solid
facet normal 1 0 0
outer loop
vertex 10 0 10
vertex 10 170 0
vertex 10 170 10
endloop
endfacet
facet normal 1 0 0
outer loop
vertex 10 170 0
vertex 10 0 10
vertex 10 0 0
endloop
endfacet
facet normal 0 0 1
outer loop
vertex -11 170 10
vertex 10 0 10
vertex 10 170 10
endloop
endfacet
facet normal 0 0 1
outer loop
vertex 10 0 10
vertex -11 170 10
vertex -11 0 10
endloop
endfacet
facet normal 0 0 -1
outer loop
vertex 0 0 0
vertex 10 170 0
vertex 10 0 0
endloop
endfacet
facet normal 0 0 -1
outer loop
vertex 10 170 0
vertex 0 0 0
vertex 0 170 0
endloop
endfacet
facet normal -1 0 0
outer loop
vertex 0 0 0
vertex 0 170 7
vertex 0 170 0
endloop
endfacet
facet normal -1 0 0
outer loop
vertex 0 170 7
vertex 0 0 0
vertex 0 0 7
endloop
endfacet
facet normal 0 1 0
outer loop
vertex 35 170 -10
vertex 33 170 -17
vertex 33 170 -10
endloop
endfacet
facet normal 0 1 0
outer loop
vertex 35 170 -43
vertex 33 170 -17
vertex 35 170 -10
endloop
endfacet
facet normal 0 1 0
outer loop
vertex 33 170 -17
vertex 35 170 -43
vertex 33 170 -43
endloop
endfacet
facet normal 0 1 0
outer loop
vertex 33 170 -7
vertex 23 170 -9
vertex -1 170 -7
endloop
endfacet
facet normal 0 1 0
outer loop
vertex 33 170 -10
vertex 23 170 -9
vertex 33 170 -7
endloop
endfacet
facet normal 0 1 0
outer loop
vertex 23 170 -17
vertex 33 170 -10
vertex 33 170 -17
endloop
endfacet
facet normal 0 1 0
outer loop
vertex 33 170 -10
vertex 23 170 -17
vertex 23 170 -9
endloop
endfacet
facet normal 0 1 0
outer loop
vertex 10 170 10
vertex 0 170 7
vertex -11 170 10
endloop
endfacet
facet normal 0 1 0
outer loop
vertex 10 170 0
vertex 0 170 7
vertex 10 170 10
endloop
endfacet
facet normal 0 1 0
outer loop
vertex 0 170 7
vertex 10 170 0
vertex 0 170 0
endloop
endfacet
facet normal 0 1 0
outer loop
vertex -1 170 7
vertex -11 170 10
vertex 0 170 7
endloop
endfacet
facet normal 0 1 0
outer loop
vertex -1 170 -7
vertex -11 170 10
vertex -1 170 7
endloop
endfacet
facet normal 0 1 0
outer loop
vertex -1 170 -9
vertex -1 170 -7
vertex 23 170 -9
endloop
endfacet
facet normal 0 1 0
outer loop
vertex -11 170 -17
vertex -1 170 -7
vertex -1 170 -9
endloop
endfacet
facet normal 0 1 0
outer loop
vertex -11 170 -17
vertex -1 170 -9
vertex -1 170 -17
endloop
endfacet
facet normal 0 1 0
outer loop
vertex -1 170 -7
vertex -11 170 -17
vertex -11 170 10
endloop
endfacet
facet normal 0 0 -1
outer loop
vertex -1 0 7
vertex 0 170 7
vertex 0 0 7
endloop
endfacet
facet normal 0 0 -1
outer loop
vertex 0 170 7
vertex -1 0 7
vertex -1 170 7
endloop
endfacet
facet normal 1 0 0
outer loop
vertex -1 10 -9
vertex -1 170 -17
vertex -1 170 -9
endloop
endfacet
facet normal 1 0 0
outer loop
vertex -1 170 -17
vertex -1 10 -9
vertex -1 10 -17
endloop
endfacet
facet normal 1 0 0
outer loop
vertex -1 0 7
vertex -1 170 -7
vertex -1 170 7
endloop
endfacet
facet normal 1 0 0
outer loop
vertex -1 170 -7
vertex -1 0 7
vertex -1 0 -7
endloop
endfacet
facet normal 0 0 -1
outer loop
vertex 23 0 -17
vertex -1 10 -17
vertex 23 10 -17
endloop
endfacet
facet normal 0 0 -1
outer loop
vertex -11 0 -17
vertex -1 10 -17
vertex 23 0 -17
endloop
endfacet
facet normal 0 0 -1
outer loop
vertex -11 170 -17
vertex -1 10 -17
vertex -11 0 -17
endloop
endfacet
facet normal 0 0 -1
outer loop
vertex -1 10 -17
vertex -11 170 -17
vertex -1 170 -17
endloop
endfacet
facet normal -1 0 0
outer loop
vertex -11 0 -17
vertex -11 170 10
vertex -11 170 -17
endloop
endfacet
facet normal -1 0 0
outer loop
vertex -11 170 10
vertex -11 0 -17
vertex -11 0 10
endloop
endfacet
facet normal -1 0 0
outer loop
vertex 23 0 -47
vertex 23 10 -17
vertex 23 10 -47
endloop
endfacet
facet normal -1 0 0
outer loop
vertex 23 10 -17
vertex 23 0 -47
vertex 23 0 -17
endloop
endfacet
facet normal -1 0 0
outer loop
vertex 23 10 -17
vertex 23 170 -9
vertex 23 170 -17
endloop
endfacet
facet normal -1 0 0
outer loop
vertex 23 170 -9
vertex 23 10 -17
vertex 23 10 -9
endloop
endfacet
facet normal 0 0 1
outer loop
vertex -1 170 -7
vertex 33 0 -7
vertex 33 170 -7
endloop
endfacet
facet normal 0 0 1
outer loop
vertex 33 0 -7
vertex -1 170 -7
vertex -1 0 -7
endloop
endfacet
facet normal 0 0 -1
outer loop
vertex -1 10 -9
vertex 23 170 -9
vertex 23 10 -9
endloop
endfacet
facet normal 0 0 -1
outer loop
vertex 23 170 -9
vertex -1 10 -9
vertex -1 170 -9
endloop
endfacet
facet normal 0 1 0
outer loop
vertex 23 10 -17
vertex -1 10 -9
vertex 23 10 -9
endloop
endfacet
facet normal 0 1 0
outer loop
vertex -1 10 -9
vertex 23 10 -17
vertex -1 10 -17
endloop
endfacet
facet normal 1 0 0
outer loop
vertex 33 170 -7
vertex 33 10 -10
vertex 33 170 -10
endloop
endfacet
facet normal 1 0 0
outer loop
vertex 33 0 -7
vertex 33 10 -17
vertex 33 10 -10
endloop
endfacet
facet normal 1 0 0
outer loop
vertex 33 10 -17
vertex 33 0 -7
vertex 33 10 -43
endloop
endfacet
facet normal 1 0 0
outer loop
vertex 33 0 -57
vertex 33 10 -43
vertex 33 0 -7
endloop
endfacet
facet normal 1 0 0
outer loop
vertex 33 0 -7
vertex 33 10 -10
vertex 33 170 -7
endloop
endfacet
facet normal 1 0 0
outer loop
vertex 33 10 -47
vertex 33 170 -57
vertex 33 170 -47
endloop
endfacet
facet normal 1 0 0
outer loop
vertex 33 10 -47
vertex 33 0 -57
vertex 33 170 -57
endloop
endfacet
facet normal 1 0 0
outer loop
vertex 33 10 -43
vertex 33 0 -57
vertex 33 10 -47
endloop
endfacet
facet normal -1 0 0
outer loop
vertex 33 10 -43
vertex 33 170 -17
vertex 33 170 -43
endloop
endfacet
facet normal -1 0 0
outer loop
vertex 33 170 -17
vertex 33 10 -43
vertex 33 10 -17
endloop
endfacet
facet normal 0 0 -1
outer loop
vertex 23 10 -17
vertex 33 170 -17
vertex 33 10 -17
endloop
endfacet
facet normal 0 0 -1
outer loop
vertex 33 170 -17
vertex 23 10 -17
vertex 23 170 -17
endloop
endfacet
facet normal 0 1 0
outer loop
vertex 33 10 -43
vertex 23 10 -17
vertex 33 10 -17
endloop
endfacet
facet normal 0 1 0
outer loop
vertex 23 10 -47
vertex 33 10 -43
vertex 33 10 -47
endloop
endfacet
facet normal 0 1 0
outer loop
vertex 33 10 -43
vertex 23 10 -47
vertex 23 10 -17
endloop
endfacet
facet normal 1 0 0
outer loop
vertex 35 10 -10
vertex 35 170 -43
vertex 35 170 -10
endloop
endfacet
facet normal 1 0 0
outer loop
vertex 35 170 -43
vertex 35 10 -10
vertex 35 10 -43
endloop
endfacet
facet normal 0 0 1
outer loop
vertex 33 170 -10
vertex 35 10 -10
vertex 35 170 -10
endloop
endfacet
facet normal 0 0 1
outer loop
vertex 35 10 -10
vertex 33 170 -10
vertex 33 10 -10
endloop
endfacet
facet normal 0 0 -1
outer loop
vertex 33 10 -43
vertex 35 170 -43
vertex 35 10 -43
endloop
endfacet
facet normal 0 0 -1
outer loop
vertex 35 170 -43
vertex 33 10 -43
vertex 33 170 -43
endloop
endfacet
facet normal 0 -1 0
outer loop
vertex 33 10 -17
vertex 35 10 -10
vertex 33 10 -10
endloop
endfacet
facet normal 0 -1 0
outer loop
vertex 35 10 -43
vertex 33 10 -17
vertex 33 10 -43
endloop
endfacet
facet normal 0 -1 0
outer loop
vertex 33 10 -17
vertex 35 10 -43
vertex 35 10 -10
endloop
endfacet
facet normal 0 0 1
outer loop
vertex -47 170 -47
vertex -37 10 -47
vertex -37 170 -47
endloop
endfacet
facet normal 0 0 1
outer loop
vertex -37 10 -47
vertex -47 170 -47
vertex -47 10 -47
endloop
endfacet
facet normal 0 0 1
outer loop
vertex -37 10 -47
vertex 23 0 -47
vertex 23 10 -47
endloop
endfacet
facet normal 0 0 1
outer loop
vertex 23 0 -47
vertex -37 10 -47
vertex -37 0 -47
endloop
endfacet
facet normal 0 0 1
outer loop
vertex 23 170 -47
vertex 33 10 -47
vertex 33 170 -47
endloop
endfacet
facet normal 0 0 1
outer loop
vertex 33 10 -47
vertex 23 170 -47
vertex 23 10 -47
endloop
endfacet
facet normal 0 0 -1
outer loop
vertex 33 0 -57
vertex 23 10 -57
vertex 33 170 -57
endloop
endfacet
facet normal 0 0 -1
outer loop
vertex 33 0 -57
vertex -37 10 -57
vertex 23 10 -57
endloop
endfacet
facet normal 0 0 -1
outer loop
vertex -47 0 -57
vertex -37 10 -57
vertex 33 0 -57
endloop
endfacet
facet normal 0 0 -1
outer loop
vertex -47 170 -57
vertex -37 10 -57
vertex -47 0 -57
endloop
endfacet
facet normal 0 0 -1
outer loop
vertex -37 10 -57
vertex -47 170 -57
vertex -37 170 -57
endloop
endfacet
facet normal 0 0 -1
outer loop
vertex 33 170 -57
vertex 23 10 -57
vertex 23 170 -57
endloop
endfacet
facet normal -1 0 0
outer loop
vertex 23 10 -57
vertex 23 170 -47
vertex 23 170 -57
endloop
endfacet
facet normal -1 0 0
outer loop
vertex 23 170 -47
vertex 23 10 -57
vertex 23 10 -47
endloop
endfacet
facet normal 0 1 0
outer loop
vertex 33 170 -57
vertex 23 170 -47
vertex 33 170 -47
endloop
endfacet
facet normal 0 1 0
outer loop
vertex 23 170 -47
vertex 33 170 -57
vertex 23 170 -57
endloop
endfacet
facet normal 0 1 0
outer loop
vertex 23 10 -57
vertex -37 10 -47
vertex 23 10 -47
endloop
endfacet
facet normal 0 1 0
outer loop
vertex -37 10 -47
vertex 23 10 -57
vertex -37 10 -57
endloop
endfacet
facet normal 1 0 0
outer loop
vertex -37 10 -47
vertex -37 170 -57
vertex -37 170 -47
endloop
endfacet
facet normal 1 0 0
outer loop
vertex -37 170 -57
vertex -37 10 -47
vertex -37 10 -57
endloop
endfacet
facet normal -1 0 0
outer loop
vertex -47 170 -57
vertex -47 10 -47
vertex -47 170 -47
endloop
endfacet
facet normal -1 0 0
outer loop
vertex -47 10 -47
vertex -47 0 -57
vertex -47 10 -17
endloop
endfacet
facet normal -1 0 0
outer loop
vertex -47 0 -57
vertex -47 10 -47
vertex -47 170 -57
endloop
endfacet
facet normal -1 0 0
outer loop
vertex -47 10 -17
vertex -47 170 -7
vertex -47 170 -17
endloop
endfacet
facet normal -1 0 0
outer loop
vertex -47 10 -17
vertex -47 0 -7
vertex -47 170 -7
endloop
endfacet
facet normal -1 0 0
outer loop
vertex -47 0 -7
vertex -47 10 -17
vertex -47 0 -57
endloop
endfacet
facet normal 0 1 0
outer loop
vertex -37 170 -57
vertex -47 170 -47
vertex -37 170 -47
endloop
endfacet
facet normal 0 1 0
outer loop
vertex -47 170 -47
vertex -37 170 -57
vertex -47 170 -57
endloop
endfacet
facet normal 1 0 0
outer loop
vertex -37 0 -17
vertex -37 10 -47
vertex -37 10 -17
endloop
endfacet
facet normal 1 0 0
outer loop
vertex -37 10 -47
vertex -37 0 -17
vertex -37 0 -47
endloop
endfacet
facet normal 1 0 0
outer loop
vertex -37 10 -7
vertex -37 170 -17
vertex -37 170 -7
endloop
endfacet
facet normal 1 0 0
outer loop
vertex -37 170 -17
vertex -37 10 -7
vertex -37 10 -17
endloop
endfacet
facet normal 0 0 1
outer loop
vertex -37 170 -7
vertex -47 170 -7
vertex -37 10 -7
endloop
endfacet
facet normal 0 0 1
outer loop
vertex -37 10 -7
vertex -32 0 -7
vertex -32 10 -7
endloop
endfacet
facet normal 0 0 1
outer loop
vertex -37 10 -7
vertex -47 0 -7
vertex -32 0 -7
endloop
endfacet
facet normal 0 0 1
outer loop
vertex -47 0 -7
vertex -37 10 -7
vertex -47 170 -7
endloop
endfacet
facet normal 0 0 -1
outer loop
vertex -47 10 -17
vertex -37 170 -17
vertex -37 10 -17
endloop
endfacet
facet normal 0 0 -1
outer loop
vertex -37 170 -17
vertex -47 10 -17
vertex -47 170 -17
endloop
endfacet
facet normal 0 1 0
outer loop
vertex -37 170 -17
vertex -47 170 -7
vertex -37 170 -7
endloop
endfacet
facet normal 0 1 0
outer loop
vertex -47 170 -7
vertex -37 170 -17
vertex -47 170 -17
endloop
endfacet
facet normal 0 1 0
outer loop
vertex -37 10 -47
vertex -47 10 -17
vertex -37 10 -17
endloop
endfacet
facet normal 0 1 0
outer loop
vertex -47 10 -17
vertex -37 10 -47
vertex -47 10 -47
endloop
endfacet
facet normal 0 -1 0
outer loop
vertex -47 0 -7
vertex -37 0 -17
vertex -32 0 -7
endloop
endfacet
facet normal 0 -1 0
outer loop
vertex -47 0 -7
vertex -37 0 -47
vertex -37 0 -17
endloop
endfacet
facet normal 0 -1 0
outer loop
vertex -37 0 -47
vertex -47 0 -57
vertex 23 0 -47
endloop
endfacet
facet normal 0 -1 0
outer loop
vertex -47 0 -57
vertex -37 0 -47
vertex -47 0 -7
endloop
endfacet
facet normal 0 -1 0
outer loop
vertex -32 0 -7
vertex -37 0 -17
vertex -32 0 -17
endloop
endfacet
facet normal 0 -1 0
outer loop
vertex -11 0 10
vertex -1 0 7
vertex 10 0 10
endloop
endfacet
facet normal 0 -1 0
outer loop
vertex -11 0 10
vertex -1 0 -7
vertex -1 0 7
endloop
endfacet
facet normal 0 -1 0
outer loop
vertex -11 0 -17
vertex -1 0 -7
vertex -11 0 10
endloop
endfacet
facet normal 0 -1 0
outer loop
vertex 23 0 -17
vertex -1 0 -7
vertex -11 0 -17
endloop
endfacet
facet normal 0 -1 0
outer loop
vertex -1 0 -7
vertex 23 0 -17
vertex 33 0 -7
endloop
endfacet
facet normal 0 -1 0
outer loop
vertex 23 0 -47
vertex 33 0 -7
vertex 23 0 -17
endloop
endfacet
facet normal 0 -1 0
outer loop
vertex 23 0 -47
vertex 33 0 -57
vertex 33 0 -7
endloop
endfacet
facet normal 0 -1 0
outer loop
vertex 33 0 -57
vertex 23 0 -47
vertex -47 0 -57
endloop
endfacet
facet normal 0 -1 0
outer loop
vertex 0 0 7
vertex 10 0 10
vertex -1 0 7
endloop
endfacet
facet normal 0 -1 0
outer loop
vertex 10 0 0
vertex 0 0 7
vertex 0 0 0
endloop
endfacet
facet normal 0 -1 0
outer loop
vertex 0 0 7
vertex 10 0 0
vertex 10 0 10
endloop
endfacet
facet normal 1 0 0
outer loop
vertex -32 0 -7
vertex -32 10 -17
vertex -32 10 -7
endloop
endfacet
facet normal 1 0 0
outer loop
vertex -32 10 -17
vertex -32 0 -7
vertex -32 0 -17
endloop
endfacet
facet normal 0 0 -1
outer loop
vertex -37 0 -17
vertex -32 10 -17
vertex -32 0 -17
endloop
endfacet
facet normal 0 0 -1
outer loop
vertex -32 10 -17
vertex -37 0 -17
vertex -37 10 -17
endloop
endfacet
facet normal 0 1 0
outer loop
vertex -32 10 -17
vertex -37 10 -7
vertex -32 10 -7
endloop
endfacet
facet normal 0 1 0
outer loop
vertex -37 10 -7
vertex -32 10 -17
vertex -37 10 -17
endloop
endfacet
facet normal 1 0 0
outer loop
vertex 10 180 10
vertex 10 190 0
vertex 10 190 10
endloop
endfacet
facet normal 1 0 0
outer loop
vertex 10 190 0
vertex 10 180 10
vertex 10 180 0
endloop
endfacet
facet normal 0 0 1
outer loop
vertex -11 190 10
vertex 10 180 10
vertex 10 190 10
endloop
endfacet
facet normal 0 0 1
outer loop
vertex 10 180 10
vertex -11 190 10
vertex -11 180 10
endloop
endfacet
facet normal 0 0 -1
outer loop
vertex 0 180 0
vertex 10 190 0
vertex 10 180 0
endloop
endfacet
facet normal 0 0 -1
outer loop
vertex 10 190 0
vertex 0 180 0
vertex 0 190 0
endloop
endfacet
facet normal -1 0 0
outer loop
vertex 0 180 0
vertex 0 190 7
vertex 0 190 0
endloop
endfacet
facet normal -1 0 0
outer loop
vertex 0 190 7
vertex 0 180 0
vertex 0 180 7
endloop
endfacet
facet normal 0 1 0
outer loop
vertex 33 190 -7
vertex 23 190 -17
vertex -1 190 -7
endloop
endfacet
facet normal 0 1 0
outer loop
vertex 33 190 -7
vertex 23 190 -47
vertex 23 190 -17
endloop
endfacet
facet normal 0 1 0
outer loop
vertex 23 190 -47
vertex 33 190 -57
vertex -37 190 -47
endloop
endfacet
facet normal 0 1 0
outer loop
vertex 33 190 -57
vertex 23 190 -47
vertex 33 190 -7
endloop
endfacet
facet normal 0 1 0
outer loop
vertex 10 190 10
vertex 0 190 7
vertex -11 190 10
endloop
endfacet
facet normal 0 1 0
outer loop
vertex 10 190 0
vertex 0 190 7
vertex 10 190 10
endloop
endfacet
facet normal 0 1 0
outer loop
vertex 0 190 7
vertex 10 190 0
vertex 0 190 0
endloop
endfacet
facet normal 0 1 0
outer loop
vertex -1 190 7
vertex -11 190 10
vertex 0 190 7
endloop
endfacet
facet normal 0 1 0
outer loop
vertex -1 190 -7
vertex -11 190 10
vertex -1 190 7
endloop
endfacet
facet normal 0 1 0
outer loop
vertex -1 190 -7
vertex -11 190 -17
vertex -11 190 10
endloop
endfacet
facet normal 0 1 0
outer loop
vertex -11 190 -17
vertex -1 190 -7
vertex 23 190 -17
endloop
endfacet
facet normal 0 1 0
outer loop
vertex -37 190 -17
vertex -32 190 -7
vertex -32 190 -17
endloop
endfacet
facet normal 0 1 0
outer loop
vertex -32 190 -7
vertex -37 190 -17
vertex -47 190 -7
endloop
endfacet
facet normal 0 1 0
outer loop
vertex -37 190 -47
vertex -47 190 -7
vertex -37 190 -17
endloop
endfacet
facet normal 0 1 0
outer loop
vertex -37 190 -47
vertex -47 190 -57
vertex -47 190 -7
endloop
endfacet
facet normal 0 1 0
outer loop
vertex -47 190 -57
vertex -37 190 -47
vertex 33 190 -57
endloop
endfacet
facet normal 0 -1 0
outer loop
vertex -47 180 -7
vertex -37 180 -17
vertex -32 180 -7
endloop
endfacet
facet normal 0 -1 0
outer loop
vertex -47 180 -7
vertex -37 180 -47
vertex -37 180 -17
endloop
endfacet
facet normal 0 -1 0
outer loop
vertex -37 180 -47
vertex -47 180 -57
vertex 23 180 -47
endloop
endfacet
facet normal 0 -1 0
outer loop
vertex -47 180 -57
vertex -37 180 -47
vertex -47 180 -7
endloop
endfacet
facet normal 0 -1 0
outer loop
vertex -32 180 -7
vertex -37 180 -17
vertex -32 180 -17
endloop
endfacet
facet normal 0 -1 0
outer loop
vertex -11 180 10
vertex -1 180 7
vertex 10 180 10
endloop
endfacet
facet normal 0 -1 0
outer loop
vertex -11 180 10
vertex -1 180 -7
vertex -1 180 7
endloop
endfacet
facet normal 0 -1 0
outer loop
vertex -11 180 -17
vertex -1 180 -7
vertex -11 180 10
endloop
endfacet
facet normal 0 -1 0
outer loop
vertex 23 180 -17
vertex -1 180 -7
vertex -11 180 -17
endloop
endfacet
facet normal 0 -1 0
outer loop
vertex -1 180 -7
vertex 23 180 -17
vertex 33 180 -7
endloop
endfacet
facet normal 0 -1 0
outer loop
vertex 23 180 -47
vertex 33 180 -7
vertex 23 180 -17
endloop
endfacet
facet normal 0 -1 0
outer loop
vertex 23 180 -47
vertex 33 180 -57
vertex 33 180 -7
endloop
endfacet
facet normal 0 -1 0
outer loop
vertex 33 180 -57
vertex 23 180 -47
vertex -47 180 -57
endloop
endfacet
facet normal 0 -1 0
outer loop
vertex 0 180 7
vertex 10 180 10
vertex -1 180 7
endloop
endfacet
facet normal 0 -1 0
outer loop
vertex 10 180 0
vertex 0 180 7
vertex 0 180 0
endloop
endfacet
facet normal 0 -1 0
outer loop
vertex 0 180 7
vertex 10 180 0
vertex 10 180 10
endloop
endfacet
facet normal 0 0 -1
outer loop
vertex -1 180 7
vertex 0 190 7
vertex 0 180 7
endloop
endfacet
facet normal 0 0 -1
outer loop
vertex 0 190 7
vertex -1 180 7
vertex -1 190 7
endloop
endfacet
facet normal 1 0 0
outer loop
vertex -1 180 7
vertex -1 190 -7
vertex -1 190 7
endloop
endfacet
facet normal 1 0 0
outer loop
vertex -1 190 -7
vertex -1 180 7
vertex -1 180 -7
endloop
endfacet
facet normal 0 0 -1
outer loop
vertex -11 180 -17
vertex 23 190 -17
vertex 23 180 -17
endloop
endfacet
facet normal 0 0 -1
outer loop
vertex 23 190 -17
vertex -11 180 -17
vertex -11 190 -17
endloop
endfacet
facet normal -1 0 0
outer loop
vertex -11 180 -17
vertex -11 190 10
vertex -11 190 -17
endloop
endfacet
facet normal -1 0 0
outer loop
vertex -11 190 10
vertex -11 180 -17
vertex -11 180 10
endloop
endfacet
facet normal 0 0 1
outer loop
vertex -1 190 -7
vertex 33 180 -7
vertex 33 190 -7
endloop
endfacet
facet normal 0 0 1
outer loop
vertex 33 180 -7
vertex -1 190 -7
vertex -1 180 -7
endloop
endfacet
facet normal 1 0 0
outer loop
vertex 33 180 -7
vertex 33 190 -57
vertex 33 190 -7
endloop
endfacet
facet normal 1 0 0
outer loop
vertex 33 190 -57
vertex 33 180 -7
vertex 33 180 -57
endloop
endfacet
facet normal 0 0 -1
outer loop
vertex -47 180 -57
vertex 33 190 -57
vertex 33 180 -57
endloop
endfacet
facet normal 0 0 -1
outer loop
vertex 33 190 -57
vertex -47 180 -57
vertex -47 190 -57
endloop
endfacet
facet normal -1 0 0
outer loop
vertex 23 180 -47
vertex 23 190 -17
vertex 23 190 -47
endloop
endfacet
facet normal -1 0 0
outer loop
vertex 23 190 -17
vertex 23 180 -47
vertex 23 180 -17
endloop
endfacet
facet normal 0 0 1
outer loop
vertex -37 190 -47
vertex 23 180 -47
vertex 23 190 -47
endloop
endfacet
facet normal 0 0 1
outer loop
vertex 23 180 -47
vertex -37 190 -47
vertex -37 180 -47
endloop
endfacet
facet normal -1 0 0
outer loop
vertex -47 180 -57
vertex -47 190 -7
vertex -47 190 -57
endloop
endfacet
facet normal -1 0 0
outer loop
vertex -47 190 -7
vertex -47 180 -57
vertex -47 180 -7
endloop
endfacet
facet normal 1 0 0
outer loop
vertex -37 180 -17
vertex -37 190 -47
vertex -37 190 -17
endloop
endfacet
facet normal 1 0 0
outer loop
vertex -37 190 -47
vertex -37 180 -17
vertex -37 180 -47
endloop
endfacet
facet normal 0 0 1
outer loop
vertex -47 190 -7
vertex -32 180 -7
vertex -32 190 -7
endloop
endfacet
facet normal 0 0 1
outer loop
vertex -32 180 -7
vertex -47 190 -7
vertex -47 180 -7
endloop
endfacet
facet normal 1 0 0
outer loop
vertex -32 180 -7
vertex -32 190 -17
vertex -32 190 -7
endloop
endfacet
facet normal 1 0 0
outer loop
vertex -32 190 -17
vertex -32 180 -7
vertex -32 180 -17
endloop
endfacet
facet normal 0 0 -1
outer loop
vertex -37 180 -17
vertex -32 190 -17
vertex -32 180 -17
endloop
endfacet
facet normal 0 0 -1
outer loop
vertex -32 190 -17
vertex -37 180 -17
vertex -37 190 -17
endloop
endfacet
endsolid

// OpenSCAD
// dimensions
width=200;
height=50;
depth=80;
back=33;
wall=10;
trap=5;

// fixed
SPACER=1;
OPENING=7;




translate([0,wall,0]) {
  cube([wall,width-4*wall,wall]);
}
translate([-SPACER,wall,OPENING]) {
  cube([SPACER,width-4*wall,10-OPENING]);
}
translate([-wall-SPACER,wall,-wall-OPENING]) {
   cube([wall,width-4*wall,wall+OPENING+10]);
}

translate([-SPACER,wall,-OPENING-wall/5]) {
  cube([back-wall+SPACER,width-4*wall,wall/5]);
}

translate([back-wall,wall,-OPENING-wall]) {
  cube([wall,width-4*wall,wall]);
}

translate([back,wall,-back-wall]) {
  cube([wall/5,width-4*wall,back]);
}

translate([back-wall,wall,-OPENING-height]) {
  cube([wall,width-4*wall,wall]);
}
translate([-depth+back,wall,-height-OPENING]) {
  cube([wall,width-4*wall,wall]);
}
translate([-depth+back,wall,-OPENING-wall]) {
  cube([wall,width-4*wall,wall]);
}





// catch
cube([10,wall,10]);

// spacer
translate([-SPACER,0,OPENING]) {
  cube([SPACER,wall,10-OPENING]);
}

//  line
translate([-wall-SPACER,0,-wall-OPENING]) {
   cube([wall,wall,wall+OPENING+10]);
}

// support
translate([-SPACER,0,-wall-OPENING]) {
  cube([back,wall,wall]);
}

// back
translate([back-wall,0,-height-OPENING]) {
  cube([wall,wall,height]);
}

// bottom
translate([-depth+back,0,-height-7]) {
  cube([depth,wall,wall]);
}

// front
translate([-depth+back,0,-height-OPENING]) {
  cube([wall,wall,height]);
}

// trap
translate([-depth+back+wall,0,-wall-OPENING]) {
  cube([trap,wall,wall]);
}




// catch
translate([0,width-2*wall,0]) {
  cube([10,wall,10]);
}

// spacer
translate([-SPACER,width-2*wall,OPENING]) {
  cube([SPACER,wall,10-OPENING]);
}

//  line
translate([-wall-SPACER,width-2*wall,-wall-OPENING]) {
   cube([wall,wall,wall+OPENING+10]);
}

// support
translate([-SPACER,width-2*wall,-wall-OPENING]) {
  cube([back,wall,wall]);
}

// back
translate([back-wall,width-2*wall,-height-OPENING]) {
  cube([wall,wall,height]);
}

// bottom
translate([-depth+back,width-2*wall,-height-7]) {
  cube([depth,wall,wall]);
}

// front
translate([-depth+back,width-2*wall,-height-OPENING]) {
  cube([wall,wall,height]);
}

// trap
translate([-depth+back+wall,width-2*wall,-wall-OPENING]) {
  cube([trap,wall,wall]);
}
